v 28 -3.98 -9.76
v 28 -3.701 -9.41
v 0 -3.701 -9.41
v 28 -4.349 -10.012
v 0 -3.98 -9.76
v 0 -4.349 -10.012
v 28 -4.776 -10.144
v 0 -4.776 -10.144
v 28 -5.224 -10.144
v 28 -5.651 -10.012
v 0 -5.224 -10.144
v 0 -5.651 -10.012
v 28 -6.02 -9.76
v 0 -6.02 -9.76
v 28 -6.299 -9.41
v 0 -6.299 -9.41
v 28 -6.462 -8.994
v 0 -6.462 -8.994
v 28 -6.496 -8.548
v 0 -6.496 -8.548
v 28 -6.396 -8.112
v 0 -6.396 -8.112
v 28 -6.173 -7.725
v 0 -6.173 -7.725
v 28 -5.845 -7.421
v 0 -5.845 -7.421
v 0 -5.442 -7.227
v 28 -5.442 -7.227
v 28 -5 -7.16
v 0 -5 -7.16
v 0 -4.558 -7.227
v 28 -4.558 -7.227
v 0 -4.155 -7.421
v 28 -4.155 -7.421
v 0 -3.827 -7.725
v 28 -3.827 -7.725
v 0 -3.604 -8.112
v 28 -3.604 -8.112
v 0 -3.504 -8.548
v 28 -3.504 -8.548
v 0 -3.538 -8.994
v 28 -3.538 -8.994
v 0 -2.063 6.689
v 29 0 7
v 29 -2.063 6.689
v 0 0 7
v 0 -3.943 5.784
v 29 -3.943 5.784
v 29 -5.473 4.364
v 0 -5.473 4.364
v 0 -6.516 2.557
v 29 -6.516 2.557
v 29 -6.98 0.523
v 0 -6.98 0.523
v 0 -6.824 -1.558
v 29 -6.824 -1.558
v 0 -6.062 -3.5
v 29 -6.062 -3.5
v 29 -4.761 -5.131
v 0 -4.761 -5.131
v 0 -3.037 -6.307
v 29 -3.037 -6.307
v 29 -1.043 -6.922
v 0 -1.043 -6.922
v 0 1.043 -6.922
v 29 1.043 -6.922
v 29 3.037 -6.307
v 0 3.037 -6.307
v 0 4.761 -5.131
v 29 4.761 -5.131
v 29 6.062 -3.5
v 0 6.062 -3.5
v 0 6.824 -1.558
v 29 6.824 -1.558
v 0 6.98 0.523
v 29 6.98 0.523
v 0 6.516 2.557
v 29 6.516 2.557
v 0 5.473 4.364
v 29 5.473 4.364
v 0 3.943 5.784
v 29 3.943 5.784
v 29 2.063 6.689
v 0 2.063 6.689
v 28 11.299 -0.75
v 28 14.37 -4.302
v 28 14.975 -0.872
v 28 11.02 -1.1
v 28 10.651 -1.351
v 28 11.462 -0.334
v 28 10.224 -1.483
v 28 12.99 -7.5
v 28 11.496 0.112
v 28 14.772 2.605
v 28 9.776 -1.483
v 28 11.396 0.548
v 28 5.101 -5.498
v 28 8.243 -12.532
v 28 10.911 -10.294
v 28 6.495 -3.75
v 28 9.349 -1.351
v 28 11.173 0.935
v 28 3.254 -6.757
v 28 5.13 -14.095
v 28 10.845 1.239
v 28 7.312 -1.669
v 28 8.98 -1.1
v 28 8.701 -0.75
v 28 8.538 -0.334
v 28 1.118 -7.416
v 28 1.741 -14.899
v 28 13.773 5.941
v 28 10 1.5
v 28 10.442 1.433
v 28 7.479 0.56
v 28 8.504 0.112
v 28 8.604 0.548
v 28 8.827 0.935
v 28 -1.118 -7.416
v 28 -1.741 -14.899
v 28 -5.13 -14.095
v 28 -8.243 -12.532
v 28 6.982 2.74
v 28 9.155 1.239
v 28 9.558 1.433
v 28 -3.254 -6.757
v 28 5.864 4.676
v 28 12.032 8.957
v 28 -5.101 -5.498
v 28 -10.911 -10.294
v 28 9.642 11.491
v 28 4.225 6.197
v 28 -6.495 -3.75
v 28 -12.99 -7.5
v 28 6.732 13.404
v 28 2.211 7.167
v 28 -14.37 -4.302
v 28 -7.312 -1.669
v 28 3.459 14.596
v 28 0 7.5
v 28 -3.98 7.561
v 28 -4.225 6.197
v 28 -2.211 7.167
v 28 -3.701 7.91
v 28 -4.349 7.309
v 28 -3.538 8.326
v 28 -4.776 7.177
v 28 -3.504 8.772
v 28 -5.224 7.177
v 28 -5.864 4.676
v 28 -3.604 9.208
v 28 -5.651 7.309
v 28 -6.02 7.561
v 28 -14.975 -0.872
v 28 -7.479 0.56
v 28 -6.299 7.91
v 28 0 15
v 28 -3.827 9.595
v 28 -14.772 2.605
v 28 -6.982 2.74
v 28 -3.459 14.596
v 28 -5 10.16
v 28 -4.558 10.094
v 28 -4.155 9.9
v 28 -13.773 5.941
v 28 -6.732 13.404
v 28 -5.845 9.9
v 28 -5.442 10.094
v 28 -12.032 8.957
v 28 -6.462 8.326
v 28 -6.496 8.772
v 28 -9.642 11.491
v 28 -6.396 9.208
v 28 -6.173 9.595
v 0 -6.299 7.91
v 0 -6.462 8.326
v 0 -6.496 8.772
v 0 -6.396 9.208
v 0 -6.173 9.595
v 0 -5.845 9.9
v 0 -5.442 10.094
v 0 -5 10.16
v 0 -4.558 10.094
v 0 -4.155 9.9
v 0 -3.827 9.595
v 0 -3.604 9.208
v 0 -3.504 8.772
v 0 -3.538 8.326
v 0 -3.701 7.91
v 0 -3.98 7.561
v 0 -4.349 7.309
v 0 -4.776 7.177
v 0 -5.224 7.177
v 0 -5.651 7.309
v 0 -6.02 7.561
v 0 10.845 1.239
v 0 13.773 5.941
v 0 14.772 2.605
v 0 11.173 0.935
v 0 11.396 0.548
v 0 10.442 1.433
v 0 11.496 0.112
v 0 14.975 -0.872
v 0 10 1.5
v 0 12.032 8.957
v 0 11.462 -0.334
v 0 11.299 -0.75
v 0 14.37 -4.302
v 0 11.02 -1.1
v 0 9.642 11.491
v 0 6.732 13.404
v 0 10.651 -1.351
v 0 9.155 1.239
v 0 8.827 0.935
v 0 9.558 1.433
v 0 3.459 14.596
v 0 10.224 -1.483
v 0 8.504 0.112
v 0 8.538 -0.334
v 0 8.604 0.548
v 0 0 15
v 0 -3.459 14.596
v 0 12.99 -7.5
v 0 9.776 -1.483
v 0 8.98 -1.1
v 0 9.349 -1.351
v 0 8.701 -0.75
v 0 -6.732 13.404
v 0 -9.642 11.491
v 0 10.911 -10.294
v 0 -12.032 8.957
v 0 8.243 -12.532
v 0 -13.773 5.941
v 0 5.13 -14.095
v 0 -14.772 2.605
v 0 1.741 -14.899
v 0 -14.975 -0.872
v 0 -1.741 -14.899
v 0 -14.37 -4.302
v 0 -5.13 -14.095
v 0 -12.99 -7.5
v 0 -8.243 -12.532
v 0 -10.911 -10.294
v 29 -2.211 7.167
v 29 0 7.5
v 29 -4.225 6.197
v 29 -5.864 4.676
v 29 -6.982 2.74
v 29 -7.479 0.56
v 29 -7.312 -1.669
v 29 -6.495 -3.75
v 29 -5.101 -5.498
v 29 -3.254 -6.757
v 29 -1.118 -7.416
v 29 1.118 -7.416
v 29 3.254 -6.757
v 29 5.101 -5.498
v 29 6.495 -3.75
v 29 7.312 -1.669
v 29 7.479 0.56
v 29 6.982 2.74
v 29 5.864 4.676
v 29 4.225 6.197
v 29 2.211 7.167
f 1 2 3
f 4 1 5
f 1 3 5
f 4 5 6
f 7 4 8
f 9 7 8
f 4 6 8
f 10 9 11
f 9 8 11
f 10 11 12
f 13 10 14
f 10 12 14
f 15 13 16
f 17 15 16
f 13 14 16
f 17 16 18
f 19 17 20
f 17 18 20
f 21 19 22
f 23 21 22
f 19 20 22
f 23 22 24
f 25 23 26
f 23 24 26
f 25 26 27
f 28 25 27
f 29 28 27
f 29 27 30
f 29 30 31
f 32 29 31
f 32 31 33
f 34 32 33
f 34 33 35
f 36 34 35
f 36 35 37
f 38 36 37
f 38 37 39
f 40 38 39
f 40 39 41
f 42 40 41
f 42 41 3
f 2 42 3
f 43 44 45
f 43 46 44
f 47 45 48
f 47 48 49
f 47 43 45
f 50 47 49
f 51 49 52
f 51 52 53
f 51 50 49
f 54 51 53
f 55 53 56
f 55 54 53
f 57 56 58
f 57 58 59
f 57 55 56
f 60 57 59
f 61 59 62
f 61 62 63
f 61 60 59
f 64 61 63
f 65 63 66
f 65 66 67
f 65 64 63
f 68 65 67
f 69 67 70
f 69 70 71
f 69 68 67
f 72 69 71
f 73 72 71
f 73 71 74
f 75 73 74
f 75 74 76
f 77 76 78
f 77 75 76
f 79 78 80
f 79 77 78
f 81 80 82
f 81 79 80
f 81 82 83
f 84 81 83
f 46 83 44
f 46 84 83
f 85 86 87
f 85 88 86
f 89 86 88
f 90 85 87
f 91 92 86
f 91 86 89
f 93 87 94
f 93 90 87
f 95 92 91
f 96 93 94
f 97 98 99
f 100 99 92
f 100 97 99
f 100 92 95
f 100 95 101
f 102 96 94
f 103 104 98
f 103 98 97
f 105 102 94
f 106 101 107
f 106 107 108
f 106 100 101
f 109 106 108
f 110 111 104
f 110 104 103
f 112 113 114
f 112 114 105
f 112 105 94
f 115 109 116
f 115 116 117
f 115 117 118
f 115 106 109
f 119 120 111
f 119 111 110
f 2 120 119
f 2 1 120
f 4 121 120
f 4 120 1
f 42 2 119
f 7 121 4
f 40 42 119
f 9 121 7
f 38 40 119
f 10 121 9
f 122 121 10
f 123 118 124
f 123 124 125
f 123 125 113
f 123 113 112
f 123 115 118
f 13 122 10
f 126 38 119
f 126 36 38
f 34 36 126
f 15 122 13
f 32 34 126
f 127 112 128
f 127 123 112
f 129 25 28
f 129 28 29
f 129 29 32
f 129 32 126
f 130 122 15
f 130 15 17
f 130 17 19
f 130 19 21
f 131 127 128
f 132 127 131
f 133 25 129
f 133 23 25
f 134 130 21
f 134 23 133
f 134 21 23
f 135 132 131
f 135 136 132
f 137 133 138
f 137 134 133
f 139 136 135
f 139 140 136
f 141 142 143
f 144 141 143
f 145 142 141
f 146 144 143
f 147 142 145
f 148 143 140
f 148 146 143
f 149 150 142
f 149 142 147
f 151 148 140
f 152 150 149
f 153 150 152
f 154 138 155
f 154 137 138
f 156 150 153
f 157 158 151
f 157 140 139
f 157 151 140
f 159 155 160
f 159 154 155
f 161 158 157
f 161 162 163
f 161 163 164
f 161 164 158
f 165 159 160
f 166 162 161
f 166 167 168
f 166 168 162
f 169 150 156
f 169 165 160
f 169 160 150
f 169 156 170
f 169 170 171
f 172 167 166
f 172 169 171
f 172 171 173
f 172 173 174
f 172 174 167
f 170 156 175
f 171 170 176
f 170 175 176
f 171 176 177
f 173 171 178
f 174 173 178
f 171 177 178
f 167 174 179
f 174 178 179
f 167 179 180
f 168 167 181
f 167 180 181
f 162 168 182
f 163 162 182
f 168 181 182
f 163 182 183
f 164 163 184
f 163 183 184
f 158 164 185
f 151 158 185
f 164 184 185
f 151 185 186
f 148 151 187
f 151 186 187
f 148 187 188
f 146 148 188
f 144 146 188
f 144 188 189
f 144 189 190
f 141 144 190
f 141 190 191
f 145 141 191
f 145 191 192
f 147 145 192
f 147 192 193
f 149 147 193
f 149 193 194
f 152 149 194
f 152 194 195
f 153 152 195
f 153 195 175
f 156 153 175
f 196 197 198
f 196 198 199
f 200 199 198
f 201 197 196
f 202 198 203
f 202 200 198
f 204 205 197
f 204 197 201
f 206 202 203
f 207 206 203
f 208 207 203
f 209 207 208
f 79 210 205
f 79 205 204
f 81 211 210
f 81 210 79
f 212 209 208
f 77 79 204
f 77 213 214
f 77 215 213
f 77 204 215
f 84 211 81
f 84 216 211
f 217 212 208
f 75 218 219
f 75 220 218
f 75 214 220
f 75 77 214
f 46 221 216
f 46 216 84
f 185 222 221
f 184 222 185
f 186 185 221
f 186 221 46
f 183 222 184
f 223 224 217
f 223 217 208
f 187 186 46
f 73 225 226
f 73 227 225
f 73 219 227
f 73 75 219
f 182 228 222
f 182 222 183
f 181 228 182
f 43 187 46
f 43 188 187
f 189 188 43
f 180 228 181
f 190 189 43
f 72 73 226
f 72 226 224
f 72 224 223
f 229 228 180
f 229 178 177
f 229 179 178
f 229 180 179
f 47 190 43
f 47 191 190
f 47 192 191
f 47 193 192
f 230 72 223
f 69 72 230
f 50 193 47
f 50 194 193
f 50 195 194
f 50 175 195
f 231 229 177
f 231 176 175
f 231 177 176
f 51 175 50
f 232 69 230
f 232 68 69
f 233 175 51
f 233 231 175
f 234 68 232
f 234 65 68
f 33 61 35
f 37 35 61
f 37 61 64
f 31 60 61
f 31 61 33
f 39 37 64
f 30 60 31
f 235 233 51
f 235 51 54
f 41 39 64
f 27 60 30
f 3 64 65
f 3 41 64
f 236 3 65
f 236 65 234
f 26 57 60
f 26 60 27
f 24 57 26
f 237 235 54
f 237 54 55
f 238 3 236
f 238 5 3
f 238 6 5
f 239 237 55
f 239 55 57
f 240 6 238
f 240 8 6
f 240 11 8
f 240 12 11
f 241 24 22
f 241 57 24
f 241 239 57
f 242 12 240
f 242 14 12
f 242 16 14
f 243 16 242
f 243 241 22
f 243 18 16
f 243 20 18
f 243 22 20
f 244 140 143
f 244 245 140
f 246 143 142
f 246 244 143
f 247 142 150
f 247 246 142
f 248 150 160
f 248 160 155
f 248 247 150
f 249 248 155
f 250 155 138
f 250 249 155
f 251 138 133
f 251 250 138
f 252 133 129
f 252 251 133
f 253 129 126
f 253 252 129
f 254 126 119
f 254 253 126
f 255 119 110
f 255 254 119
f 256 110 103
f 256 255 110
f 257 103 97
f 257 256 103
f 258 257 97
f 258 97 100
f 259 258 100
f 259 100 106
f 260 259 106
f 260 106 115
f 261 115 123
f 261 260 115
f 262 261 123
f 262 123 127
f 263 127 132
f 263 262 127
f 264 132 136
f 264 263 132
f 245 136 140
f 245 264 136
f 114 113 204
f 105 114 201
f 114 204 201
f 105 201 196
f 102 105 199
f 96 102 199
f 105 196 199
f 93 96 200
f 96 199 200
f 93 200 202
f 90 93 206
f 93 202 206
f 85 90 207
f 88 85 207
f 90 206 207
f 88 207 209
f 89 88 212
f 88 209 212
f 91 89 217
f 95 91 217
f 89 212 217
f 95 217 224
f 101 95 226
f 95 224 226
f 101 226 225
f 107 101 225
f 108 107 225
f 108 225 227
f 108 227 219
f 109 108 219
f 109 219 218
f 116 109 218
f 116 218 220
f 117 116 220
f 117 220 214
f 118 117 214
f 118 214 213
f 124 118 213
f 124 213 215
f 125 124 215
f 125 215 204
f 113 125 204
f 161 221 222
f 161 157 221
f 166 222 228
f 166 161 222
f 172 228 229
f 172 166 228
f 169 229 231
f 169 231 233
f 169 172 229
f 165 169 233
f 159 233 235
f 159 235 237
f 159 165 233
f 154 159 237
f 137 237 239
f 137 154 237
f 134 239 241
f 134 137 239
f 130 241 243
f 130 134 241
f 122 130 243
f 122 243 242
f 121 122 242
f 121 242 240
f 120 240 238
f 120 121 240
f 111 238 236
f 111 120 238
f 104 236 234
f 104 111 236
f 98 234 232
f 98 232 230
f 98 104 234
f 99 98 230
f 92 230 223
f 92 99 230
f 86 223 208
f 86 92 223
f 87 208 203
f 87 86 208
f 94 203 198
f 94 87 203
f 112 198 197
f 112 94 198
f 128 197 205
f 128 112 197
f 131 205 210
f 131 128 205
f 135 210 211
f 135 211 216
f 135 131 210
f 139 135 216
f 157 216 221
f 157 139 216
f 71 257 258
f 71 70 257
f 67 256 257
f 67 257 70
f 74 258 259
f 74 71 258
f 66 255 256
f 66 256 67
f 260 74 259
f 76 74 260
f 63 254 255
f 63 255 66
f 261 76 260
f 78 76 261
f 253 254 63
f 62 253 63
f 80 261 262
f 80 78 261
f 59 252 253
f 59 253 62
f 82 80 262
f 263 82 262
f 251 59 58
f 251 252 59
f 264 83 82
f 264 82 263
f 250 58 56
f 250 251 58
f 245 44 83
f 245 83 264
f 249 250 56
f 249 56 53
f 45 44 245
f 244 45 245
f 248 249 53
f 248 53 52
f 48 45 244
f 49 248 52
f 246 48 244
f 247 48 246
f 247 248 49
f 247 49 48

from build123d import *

# Parameters (mm, degrees)
CUT_EXTRUDE1_REACH = 37.93
SKETCH3_R          = 1.5
CIRPATTERN1_COUNT  = 3


with BuildPart() as part:
    # Sketch2 → Revolve1 (revolve)
    with BuildSketch(Plane.XY, mode=Mode.PRIVATE) as revolve1_sk:
        Polygon((0, 15), (28, 15), (28, 7.5), (29, 7.5), (29, 7), (0, 7), align=None)
    revolve(revolve1_sk.sketch.rotate(Axis((0, 0, 0), (1, 0, 0)), 90), axis=Axis((0, 0, 0), (1, 0, 0)))

    # Sketch3 → Cut-Extrude1 (cut, up to next)
    with BuildSketch(Plane.ZY, mode=Mode.PRIVATE) as cut_extrude1_sk1:
        with Locations((0, 10)):
            Circle(SKETCH3_R)
    cut_extrude1_tool1 = extrude(cut_extrude1_sk1.sketch, amount=-CUT_EXTRUDE1_REACH, mode=Mode.PRIVATE) & part.part
    cut_extrude1 = cut_extrude1_tool1.solids().sort_by_distance((0, 10, 0))[0]
    add(cut_extrude1, mode=Mode.SUBTRACT)

    # CirPattern1: Cut-Extrude1 ×3 about axis
    cirpattern1_axis = Axis((0, 0, 0), (1, 0, 0))
    for i in range(1, CIRPATTERN1_COUNT):
        add(cut_extrude1.rotate(cirpattern1_axis, i * 360 / CIRPATTERN1_COUNT), mode=Mode.SUBTRACT)


solid = part.part
